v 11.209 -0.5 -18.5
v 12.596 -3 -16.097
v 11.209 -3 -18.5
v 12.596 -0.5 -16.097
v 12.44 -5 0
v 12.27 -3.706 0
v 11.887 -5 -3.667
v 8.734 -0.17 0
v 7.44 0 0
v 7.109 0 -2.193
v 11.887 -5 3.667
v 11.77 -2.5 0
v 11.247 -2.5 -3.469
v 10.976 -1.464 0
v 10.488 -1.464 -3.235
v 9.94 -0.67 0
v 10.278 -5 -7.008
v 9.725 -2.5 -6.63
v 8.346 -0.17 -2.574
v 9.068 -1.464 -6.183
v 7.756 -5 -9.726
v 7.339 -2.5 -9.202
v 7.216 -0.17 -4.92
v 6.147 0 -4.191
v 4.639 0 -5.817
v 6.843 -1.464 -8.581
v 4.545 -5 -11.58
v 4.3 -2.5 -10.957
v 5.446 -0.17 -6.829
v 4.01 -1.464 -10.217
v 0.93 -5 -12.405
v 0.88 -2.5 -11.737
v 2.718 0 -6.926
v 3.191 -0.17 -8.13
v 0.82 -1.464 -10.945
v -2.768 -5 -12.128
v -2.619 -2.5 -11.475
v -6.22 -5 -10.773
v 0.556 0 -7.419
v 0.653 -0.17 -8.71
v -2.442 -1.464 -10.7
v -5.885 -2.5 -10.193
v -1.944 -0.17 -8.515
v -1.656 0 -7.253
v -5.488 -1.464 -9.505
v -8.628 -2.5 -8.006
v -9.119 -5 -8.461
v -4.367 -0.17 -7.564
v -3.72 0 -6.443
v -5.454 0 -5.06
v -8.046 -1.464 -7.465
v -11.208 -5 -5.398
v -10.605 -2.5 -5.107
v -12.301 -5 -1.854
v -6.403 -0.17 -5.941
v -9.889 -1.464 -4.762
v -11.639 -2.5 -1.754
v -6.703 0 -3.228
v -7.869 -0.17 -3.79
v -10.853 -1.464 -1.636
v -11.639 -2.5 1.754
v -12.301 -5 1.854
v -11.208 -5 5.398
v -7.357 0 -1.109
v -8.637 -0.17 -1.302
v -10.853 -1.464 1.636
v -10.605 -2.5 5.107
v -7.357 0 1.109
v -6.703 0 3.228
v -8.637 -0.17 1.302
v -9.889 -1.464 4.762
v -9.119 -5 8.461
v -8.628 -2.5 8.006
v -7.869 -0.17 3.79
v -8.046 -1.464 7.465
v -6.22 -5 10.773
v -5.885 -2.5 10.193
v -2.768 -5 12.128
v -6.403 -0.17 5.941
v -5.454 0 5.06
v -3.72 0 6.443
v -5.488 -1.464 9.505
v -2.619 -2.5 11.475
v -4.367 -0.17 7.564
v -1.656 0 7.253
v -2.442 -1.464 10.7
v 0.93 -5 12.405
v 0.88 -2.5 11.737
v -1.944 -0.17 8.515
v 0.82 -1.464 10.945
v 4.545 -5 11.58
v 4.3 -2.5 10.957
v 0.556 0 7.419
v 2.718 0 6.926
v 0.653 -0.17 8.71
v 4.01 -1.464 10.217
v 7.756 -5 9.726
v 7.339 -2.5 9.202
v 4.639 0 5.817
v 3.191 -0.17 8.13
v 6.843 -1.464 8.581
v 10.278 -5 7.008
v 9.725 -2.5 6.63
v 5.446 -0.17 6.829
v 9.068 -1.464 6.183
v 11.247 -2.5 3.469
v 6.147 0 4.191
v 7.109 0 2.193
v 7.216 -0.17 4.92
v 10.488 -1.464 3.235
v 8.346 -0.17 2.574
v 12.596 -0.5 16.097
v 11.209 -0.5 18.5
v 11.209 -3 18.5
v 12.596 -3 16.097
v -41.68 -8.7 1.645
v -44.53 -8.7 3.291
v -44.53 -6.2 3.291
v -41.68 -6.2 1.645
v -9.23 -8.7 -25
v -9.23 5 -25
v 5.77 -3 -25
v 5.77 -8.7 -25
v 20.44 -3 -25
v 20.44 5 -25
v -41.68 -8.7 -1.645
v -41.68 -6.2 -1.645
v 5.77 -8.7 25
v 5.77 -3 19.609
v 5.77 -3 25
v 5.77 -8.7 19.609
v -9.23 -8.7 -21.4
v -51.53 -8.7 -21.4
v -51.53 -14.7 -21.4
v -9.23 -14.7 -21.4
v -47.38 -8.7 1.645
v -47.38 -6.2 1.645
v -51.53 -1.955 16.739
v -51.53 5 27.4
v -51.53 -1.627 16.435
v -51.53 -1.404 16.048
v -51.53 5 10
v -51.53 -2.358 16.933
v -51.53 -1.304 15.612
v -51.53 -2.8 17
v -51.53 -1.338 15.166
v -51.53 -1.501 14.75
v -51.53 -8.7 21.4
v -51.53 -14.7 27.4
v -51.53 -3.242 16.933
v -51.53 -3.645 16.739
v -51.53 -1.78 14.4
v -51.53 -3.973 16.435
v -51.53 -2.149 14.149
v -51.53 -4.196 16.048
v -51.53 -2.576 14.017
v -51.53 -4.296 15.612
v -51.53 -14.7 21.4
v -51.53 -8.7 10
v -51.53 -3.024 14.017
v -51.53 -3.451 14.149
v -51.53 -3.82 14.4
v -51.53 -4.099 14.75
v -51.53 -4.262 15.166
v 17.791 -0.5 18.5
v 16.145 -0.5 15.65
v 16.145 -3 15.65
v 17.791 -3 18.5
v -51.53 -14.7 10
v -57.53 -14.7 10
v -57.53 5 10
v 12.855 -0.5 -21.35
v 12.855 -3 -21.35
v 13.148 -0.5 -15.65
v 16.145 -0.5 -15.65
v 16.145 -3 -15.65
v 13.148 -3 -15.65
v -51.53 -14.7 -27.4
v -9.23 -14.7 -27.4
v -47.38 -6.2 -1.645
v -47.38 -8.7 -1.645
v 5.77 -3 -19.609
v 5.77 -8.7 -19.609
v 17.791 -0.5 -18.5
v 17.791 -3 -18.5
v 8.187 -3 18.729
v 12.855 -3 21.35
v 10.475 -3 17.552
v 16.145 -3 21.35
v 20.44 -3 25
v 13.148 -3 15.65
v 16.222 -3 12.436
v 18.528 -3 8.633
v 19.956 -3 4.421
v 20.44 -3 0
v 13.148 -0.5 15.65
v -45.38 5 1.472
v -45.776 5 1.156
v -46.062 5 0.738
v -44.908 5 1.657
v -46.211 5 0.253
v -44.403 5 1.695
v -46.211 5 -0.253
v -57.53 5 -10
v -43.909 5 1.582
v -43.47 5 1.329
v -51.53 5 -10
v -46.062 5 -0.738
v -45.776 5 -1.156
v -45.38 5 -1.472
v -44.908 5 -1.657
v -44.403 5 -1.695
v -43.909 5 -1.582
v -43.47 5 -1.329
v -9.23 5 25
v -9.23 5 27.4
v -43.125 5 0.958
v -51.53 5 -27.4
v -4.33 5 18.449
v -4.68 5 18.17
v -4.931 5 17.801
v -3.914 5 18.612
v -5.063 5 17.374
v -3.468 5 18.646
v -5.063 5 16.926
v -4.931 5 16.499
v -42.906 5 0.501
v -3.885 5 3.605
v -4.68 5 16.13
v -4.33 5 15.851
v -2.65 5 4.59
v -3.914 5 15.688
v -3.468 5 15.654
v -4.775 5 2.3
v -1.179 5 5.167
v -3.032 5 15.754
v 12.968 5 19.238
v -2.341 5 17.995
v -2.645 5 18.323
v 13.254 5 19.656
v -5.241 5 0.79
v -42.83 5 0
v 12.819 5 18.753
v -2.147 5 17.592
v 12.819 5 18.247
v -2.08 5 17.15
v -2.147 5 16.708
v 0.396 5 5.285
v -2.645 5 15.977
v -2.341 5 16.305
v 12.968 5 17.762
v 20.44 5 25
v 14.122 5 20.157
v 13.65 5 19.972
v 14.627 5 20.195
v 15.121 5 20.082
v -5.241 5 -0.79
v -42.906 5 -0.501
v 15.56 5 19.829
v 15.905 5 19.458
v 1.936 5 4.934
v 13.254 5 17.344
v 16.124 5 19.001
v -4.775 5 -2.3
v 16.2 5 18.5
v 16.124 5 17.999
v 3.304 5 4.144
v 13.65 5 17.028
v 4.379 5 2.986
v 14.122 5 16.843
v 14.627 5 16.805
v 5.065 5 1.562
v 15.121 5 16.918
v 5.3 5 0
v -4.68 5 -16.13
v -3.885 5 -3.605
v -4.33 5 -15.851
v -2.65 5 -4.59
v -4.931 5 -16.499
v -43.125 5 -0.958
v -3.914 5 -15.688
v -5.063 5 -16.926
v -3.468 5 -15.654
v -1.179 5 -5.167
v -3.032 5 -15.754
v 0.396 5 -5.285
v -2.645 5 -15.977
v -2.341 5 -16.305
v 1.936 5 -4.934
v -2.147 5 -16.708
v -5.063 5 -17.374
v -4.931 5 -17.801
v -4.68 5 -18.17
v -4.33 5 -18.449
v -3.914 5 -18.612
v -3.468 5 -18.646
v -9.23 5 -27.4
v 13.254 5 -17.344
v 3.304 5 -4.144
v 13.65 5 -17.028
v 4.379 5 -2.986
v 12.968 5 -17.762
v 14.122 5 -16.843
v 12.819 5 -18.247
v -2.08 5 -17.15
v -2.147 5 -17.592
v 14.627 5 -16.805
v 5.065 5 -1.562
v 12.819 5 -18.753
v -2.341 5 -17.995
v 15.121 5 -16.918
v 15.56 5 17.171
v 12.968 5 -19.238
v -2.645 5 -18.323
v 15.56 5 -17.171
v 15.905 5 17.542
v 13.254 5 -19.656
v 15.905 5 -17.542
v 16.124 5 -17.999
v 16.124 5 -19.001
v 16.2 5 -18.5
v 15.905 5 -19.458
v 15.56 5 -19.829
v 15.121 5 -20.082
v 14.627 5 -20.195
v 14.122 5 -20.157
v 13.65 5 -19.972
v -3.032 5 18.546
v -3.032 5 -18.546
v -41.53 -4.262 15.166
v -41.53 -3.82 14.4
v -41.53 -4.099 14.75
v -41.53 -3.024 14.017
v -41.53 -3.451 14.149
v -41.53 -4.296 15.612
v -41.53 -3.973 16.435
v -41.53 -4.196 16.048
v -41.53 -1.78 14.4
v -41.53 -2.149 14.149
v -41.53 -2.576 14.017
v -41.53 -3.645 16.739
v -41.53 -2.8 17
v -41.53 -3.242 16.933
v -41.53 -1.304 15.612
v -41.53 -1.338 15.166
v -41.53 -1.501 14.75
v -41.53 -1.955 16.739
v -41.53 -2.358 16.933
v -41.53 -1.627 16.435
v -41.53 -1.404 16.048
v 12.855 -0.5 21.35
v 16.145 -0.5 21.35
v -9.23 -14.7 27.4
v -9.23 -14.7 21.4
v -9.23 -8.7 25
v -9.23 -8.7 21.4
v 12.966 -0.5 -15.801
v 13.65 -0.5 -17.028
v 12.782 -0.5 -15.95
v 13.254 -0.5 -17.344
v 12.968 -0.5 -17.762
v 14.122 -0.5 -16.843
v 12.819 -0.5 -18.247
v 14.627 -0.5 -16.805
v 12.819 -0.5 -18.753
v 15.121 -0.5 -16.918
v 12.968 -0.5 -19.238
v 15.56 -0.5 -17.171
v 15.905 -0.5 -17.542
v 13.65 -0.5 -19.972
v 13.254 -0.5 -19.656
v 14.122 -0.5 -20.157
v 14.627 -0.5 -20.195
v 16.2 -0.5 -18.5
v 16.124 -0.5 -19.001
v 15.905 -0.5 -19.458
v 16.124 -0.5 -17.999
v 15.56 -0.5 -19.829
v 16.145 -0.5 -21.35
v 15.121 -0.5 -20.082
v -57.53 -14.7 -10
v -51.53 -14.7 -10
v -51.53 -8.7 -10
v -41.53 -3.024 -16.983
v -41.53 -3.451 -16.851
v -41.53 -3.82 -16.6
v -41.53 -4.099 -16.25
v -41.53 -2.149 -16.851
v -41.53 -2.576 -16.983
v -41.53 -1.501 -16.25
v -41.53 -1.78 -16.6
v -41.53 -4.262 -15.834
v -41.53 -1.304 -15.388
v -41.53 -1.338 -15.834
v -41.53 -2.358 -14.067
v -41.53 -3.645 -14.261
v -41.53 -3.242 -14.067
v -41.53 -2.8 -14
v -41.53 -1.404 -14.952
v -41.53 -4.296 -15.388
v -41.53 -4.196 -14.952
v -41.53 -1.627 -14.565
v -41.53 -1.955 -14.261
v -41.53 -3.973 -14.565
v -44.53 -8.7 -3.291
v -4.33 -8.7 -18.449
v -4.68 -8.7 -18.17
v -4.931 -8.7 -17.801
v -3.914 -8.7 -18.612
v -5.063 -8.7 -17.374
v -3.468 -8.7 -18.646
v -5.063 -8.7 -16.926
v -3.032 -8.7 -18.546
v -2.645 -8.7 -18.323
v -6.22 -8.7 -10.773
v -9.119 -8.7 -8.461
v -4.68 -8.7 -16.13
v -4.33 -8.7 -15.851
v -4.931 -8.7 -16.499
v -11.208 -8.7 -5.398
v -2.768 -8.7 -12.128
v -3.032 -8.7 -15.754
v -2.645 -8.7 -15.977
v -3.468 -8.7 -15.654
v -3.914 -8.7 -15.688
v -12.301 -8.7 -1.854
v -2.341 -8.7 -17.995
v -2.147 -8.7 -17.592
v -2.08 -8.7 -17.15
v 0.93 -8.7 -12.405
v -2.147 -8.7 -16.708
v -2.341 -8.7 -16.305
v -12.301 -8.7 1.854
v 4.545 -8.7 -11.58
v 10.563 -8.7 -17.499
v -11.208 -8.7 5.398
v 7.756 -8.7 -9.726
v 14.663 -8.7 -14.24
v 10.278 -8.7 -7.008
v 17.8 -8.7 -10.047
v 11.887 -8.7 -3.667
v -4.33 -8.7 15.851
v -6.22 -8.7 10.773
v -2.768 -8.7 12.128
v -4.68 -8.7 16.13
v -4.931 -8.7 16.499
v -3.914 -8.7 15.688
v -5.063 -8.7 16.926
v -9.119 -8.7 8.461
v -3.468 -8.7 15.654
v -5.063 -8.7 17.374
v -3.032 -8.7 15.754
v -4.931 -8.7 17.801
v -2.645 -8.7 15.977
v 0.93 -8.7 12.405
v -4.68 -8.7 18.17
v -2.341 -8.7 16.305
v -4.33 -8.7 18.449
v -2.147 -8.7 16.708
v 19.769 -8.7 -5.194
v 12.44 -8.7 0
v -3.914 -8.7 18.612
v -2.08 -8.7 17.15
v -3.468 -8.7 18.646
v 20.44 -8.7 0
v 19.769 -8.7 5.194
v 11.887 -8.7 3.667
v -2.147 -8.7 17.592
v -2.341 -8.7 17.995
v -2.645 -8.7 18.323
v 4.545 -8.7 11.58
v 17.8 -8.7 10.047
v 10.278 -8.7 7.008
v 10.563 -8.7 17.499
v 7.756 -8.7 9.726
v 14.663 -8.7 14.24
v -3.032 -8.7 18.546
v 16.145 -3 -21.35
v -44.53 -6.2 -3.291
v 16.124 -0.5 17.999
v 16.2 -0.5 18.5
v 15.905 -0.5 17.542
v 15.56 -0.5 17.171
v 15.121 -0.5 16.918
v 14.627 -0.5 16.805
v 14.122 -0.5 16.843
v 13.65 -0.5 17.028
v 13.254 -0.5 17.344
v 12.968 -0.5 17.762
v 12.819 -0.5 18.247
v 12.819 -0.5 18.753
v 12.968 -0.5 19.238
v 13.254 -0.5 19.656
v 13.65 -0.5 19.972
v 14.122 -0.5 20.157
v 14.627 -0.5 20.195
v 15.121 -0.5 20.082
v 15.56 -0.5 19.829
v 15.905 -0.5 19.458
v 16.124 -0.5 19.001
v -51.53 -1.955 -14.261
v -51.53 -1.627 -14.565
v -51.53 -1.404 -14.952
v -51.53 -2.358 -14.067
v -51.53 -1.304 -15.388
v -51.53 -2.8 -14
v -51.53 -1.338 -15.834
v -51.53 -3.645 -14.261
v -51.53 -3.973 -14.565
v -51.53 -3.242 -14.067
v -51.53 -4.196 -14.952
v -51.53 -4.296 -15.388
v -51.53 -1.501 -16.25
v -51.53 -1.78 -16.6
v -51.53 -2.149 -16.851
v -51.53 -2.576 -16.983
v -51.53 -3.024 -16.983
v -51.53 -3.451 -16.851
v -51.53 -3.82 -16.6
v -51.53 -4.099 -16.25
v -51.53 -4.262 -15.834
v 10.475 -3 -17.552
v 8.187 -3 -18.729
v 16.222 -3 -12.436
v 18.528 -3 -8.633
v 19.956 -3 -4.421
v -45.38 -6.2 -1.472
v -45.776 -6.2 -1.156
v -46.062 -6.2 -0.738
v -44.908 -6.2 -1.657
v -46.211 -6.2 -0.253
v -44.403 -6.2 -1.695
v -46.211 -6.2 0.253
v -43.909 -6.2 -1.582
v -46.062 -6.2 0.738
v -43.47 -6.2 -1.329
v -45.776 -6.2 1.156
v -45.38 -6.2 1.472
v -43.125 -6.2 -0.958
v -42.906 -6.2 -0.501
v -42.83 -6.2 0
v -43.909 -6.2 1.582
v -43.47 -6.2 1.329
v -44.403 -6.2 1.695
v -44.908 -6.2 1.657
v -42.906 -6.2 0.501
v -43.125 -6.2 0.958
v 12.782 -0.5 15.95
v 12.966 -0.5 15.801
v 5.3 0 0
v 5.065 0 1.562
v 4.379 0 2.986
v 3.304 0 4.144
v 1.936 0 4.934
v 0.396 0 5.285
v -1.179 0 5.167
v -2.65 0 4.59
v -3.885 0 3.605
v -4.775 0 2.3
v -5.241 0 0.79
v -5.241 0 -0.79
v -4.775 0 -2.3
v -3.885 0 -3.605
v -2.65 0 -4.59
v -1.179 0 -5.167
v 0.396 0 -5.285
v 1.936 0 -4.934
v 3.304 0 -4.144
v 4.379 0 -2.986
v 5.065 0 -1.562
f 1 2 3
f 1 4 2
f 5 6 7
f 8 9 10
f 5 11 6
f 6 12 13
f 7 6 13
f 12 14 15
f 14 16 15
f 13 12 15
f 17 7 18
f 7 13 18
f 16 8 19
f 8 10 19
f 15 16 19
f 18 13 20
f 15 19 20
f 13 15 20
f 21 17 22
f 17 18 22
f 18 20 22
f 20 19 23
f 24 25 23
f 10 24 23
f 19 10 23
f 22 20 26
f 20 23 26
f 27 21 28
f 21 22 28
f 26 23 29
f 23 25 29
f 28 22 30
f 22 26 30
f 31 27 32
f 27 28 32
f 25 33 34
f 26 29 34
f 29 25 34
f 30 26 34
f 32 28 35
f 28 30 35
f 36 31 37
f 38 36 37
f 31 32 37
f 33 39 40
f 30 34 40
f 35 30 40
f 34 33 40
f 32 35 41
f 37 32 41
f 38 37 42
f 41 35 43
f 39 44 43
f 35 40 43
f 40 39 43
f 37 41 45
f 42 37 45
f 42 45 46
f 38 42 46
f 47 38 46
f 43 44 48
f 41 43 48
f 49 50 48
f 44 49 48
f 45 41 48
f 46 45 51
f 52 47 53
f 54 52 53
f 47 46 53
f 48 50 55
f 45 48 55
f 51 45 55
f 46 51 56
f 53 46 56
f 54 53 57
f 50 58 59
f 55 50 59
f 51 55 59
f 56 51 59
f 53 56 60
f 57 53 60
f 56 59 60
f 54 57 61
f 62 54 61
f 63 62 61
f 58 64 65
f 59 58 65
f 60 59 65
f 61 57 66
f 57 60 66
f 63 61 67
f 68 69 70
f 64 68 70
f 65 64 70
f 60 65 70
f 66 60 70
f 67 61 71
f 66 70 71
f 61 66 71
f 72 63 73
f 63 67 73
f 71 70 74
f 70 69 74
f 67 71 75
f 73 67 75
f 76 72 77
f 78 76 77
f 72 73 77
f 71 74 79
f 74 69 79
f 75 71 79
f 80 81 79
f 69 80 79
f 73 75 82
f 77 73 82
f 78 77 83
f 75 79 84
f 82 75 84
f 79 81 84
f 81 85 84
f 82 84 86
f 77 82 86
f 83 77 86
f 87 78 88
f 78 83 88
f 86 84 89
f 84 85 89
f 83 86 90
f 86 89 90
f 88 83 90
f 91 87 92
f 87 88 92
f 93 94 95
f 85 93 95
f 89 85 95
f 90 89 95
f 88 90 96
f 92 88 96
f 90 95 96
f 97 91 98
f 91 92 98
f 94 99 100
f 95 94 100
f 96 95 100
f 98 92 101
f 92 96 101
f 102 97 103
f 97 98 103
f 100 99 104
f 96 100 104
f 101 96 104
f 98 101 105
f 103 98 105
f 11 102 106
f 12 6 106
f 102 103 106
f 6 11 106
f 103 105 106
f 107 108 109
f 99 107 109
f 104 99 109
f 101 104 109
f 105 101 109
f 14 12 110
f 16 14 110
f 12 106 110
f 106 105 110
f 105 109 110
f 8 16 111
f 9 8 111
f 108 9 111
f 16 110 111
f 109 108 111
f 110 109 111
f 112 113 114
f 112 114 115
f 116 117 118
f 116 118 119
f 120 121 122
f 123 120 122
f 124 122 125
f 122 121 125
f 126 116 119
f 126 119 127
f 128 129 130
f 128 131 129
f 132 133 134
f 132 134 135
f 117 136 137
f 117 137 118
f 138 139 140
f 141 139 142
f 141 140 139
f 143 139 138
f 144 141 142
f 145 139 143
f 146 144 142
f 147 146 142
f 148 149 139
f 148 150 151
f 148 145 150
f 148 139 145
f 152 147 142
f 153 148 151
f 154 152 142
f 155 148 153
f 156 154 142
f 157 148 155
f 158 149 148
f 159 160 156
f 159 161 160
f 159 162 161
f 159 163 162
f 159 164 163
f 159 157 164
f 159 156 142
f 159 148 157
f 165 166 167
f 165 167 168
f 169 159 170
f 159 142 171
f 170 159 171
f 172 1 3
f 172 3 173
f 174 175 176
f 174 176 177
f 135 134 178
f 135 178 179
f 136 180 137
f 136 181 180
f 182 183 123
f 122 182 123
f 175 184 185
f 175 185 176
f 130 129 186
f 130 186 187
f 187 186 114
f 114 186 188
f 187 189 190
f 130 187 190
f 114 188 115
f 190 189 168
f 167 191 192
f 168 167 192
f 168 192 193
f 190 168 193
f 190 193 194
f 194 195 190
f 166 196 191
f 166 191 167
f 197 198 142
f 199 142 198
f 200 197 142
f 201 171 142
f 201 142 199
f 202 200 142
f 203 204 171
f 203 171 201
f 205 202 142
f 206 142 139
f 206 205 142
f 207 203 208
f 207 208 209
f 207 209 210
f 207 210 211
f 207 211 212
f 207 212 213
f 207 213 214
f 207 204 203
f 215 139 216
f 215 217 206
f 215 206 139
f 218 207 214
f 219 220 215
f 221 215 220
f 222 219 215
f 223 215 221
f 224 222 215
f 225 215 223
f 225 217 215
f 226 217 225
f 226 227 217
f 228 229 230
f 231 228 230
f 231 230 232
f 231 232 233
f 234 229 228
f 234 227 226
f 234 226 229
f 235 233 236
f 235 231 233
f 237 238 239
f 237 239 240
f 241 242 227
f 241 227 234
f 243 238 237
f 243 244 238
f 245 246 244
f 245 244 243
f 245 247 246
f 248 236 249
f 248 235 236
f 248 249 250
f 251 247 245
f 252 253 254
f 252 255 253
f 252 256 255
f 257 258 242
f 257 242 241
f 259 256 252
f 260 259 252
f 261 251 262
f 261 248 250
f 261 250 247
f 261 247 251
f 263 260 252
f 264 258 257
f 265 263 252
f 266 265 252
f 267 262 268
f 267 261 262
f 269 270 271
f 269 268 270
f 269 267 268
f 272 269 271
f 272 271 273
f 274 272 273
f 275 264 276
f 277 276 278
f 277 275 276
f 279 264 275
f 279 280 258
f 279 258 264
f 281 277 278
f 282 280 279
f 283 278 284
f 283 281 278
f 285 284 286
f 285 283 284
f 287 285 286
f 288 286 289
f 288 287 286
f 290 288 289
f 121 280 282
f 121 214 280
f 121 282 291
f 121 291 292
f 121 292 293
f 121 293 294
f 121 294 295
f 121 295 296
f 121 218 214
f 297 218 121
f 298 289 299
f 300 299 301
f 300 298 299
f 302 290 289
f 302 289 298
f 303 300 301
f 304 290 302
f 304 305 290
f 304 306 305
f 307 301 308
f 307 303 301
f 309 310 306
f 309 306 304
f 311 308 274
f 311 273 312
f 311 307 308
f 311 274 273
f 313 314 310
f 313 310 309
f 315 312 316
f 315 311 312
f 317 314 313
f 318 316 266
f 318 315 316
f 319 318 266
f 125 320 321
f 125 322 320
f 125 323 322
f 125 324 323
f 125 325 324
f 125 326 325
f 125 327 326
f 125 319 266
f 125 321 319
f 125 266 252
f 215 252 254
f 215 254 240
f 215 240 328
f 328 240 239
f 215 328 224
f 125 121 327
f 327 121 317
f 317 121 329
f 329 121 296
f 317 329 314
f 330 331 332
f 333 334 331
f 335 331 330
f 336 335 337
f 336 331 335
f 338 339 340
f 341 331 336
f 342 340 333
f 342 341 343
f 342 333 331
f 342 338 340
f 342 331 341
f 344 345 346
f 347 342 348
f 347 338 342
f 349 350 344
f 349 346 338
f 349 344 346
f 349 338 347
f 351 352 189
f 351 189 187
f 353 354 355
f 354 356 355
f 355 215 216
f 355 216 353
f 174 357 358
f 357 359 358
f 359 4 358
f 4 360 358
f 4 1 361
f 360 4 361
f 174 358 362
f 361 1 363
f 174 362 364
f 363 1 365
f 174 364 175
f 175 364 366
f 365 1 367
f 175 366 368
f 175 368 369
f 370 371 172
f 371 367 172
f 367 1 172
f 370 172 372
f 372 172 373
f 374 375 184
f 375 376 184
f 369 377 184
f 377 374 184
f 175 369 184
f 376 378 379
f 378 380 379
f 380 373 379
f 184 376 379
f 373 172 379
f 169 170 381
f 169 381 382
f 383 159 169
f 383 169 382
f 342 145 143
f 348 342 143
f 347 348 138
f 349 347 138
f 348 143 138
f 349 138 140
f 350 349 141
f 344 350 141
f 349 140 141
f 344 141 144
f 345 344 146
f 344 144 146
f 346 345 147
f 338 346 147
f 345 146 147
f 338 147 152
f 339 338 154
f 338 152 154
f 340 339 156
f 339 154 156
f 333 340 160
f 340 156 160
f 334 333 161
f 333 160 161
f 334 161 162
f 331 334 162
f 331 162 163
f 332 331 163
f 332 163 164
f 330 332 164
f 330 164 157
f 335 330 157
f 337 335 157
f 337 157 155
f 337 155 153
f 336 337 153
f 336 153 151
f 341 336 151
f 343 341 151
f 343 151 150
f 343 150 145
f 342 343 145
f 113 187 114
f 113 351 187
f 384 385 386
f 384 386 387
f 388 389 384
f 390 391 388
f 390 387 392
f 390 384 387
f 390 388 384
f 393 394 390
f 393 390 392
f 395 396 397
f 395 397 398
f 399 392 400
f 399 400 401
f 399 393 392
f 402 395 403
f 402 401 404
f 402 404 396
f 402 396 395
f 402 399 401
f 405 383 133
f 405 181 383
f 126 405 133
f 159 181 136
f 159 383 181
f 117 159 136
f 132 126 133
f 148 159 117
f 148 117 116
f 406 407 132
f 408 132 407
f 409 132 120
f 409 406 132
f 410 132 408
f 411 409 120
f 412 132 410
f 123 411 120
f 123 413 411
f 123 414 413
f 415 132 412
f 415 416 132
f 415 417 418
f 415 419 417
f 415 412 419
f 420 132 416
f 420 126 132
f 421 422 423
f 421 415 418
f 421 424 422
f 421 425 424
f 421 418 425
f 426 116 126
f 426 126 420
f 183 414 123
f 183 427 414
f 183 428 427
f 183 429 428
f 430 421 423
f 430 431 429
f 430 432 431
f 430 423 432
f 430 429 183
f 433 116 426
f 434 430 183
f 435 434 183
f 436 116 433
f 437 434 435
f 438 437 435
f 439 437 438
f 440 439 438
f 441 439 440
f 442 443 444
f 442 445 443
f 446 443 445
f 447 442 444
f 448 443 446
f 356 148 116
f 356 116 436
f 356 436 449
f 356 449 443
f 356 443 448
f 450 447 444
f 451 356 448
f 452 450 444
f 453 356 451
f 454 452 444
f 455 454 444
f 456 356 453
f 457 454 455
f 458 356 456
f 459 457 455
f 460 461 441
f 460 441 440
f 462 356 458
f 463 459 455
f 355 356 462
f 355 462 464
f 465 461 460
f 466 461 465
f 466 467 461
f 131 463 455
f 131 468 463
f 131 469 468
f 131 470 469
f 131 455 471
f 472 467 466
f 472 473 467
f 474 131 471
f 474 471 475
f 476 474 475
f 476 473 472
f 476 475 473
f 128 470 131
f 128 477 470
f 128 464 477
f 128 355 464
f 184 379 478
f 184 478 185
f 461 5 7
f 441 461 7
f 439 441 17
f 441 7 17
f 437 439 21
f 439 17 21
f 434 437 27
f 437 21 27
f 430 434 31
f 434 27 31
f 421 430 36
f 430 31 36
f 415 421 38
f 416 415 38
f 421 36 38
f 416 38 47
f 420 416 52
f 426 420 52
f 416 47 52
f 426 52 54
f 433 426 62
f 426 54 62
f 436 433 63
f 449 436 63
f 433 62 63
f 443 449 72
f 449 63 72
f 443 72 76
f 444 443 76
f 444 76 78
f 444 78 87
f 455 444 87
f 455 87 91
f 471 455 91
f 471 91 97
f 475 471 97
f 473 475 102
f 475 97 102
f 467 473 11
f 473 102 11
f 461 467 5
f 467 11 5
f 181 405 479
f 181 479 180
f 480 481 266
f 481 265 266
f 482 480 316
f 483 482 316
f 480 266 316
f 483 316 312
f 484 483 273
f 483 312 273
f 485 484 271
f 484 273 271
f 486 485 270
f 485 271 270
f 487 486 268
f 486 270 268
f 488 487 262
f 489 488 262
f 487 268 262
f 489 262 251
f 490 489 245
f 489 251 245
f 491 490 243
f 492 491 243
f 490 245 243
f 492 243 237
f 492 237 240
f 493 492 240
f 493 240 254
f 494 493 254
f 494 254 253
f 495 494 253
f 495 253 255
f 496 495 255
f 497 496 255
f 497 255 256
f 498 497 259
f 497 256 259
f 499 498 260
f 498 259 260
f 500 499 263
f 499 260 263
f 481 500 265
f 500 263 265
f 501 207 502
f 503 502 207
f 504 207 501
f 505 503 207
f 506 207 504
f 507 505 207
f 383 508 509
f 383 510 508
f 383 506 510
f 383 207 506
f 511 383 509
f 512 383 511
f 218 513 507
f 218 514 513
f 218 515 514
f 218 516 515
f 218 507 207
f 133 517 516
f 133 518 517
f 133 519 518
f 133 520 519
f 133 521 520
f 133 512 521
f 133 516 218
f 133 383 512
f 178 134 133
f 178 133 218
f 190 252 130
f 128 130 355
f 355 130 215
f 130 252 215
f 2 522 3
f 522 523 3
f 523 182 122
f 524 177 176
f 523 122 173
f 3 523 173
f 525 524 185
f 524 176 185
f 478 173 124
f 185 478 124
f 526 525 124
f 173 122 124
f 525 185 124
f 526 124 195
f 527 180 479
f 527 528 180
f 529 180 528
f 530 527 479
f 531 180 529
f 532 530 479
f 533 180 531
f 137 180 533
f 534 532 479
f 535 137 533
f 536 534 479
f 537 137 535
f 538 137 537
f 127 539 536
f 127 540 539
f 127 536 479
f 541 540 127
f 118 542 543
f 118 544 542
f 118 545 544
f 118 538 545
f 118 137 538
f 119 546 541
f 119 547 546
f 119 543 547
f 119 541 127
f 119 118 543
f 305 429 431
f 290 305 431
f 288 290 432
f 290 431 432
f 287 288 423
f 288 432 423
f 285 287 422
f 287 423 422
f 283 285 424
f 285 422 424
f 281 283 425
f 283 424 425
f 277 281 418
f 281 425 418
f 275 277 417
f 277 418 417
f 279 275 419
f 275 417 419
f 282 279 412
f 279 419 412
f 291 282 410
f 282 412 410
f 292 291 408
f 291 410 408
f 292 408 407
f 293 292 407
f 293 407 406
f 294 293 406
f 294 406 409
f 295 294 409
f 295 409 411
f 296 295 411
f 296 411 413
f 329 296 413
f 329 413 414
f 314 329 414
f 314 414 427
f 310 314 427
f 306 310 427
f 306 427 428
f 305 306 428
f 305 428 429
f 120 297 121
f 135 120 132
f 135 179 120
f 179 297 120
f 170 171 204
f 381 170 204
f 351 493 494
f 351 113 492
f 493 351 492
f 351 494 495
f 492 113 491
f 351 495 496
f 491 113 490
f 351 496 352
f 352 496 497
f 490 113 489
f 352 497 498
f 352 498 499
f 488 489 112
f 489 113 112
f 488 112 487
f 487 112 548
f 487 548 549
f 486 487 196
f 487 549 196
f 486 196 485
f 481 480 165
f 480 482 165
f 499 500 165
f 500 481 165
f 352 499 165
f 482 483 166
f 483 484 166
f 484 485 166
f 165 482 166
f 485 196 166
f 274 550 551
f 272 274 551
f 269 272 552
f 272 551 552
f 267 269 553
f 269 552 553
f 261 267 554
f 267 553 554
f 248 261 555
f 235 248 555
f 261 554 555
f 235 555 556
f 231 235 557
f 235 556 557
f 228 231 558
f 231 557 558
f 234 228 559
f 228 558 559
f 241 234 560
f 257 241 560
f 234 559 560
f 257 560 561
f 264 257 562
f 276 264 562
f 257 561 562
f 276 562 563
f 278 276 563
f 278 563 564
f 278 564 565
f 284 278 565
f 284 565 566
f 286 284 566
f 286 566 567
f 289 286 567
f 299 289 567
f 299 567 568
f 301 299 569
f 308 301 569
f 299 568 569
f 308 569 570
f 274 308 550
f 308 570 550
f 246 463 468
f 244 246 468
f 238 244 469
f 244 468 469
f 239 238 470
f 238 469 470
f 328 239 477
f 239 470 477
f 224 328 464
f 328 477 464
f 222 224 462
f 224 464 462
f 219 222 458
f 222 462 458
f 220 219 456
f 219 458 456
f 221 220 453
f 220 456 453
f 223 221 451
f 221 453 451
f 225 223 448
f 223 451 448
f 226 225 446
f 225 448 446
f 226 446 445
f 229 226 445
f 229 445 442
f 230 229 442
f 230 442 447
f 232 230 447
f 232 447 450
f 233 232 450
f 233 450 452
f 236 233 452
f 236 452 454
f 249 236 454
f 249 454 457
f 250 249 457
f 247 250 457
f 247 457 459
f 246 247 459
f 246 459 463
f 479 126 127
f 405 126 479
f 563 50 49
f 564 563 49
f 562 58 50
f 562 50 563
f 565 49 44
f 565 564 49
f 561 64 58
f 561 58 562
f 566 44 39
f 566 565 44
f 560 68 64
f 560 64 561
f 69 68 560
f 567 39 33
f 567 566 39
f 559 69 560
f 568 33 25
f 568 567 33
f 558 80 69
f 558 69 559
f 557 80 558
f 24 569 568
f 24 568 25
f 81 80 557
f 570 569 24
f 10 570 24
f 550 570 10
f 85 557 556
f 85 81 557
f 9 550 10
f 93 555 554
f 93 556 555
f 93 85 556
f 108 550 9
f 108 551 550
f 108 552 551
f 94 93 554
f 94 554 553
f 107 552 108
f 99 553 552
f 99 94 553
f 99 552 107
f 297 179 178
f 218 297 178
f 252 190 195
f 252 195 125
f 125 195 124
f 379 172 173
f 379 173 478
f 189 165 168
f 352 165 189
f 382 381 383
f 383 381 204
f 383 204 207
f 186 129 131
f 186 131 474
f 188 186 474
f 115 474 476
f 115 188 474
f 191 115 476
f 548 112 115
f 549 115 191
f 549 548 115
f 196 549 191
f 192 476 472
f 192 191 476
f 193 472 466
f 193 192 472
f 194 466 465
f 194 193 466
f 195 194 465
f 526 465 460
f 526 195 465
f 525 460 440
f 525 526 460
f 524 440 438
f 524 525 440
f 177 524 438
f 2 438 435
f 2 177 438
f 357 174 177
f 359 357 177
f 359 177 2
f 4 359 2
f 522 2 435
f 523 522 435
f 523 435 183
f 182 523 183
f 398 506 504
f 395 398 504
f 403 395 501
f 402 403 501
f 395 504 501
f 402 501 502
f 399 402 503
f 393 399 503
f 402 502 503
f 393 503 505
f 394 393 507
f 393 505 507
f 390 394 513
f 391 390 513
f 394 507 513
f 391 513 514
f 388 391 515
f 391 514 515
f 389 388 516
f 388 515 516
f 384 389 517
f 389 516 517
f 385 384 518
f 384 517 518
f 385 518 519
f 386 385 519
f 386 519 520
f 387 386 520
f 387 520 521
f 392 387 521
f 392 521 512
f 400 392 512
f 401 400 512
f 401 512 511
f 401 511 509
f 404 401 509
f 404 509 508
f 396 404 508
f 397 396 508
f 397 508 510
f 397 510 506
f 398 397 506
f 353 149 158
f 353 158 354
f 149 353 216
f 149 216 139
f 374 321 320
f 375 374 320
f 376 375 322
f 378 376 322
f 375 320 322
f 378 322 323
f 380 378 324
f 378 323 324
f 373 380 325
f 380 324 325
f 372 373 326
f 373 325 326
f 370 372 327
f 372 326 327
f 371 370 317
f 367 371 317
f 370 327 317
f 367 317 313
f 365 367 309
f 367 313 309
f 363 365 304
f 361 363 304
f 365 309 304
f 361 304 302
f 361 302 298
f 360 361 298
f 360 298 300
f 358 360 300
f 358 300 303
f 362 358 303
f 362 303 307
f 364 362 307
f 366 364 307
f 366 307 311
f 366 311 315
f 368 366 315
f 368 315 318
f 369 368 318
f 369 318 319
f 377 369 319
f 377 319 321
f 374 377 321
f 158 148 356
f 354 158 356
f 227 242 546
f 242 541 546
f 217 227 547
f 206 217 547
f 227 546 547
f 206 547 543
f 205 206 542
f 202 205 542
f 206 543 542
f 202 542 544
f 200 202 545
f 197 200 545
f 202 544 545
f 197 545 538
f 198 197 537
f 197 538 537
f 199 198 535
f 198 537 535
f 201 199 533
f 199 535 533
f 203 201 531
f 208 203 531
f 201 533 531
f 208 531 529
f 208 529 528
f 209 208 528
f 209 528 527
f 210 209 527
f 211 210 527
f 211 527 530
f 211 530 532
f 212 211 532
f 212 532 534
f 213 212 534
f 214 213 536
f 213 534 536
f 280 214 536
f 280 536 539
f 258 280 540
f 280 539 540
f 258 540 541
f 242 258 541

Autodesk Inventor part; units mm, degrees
ref_plane "YZ Plane" through (0, 0, 0) normal (1, 0, 0) x (0, 1, 0)
ref_plane "XZ Plane" through (0, 0, 0) normal (0, 1, 0) x (-1, 0, 0)
ref_plane "XY Plane" through (0, 0, 0) normal (0, 0, 1) x (1, 0, 0)
sketch "Sketch1" plane through (0, 0, 0) normal (0, 0, 1) x (1, 0, 0)
  line L0 (0, -8.6) -> (12.34, -8.6) construction
  line L1 (0, 0) -> (0, -8.6)
  line L2 (0, 0) -> (0, -2.1)
  line L3 (0, -2.1) -> (5.3, -2.1)
  line L4 (5.3, -2.1) -> (5.3, 0)
  line L5 (5.3, 0) -> (7.44, 0)
  line L6 (12.44, -8.7) -> (12.44, -5)
  arc A0 (12.44, -5) -> (7.44, 0) centre (7.44, -5) ccw
  line L7 (12.44, -8.7) -> (20.44, -8.7)
  line L8 (20.44, -8.7) -> (20.44, 5)
  line L9 (20.44, 5) -> (0, 5)
  line L10 (0, 5) -> (0, -2.1)
  line L11 (-4.088, 0) -> (24.528, 0) projected
  dimension "d2" = 12.34
  dimension "d3" = 8.6
  dimension "d7" = 0
  dimension "d11" = 5.3
  dimension "d12" = 2.1
  dimension "d14" = 5
  dimension "d15" = 8
  dimension "d16" = 13.7
  dimension "d17" = 3.7
  dimension "d18" = 5
revolve "Revolution2" add sketch "Sketch1" angle 360 about axis through (0, 5, 0) along (0, -1, 0)
sketch "Sketch2" plane through (0, 5, 0) normal (0, 1, 0) x (1, 0, 0)
  line L0 (-25, 25) -> (25, 25)
  line L1 (25, 25) -> (25, -25)
  line L2 (25, -25) -> (-25, -25)
  line L3 (-25, -25) -> (-25, 25)
  line L4 (-18.5, 18.5) -> (14.5, 18.5) construction
  line L5 (14.5, 18.5) -> (14.5, -18.5) construction
  line L6 (14.5, -18.5) -> (-18.5, -18.5) construction
  line L7 (-18.5, -18.5) -> (-18.5, 18.5) construction
  circle A0 centre (-18.5, 18.5) radius 1.7
  circle A1 centre (14.5, 18.5) radius 1.7
  circle A2 centre (-18.5, -18.5) radius 1.7
  circle A3 centre (14.5, -18.5) radius 1.7
  line L8 (12.8546, 21.35) -> (16.1454, 21.35)
  line L9 (16.1454, 21.35) -> (17.7909, 18.5)
  line L10 (17.7909, 18.5) -> (16.1454, 15.65)
  line L11 (16.1454, 15.65) -> (12.8546, 15.65)
  line L12 (12.8546, 15.65) -> (11.2091, 18.5)
  line L13 (11.2091, 18.5) -> (12.8546, 21.35)
  line L14 (-17.6058, 15.3329) -> (-20.7956, 16.142)
  line L15 (-20.7956, 16.142) -> (-21.6899, 19.3091)
  line L16 (-21.6899, 19.3091) -> (-19.3942, 21.6671)
  line L17 (-19.3942, 21.6671) -> (-16.2044, 20.858)
  line L18 (-16.2044, 20.858) -> (-15.3101, 17.6909)
  line L19 (-15.3101, 17.6909) -> (-17.6058, 15.3329)
  line L20 (-16.0239, -20.6677) -> (-19.1393, -21.7282)
  line L21 (-19.1393, -21.7282) -> (-21.6153, -19.5605)
  line L22 (-21.6153, -19.5605) -> (-20.9761, -16.3323)
  line L23 (-20.9761, -16.3323) -> (-17.8607, -15.2718)
  line L24 (-17.8607, -15.2718) -> (-15.3847, -17.4395)
  line L25 (-15.3847, -17.4395) -> (-16.0239, -20.6677)
  line L26 (17.7909, -18.5) -> (16.1454, -21.35)
  line L27 (16.1454, -21.35) -> (12.8546, -21.35)
  line L28 (12.8546, -21.35) -> (11.2091, -18.5)
  line L29 (11.2091, -18.5) -> (12.8546, -15.65)
  line L30 (12.8546, -15.65) -> (16.1454, -15.65)
  line L31 (16.1454, -15.65) -> (17.7909, -18.5)
  circle A4 centre (0, 0) radius 12.44 projected
  circle A5 centre (0, 0) radius 12.44 projected
  dimension "d25" = 33
  dimension "d27" = 18.5
  dimension "d28" = 18.5
  dimension "d29" = 37
  dimension "d30" = 3.4
  dimension "d31" = 3.4
  dimension "d32" = 3.4
  dimension "d33" = 3.4
  dimension "d34" = 5.7
  dimension "d36" = 5.7
  dimension "d37" = 5.7
  dimension "d38" = 5.7
  dimension "d39" = 50
  dimension "d40" = 50
  dimension "d41" = 25
  dimension "d42" = 25
extrude "Extrusion1" add sketch "Sketch2" against normal blind 8 contours L0 L1 L2 L3
extrude "Extrusion2" add sketch "Sketch2" against normal blind 5.5 contours L8 L9 L10 L11 L12 L13 | L14 L15 L16 L17 L18 L19 | L20 L21 L22 L23 L24 L25 | L26 L27 L28 L29 L30 L31
sketch "Sketch4" plane through (0, -2.1, 0) normal (0, -1, 0) x (1, 0, 0)
  circle A0 centre (0, 0) radius 5.3 projected
  point P0 (0, 0)
extrude "Extrusion4" cut sketch "Sketch4" against normal blind 19.5
sketch "Sketch5" plane through (0, -8.7, 0) normal (0, -1, 0) x (1, 0, 0)
  circle A0 centre (0, 0) radius 20.44 projected
  circle A1 centre (0, 0) radius 12.44 projected
  line L0 (-25, -25) -> (25, -25) projected
  line L1 (25, -25) -> (25, 25) projected
  line L2 (25, 25) -> (-25, 25) projected
  line L3 (-25, 25) -> (-25, -25) projected
  line L4 (12.8546, -21.35) -> (11.2091, -18.5) projected
  line L5 (11.2091, -18.5) -> (12.5962, -16.0975) projected
  line L6 (16.1454, -15.65) -> (17.7909, -18.5) projected
  line L7 (17.7909, -18.5) -> (16.1454, -21.35) projected
  line L8 (16.1454, -21.35) -> (12.8546, -21.35) projected
  line L9 (-15.3101, -17.6909) -> (-16.2044, -20.858) projected
  line L10 (-16.2044, -20.858) -> (-19.3942, -21.6671) projected
  line L11 (-19.3942, -21.6671) -> (-21.6899, -19.3091) projected
  line L12 (-21.6899, -19.3091) -> (-20.7956, -16.142) projected
  line L13 (-20.7956, -16.142) -> (-17.6058, -15.3329) projected
  line L14 (-16.0239, 20.6677) -> (-15.3847, 17.4395) projected
  line L15 (-17.8607, 15.2718) -> (-20.9761, 16.3323) projected
  line L16 (-20.9761, 16.3323) -> (-21.6153, 19.5605) projected
  line L17 (-21.6153, 19.5605) -> (-19.1393, 21.7282) projected
  line L18 (-19.1393, 21.7282) -> (-16.0239, 20.6677) projected
  line L19 (17.7909, 18.5) -> (16.1454, 15.65) projected
  line L20 (12.5962, 16.0975) -> (11.2091, 18.5) projected
  line L21 (11.2091, 18.5) -> (12.8546, 21.35) projected
  line L22 (12.8546, 21.35) -> (16.1454, 21.35) projected
  line L23 (16.1454, 21.35) -> (17.7909, 18.5) projected
  arc A2 (12.5962, 16.0975) -> (12.5962, -16.0975) centre (0, 0) ccw projected
  line L24 (-25, 25) -> (3.4372, 20.1489)
  line L25 (-25, -25) -> (3.4372, -20.1489)
  circle A3 centre (0, 0) radius 20.44 projected
  arc A4 (3.4372, 20.1489) -> (3.4372, -20.1489) centre (0, 0) ccw
  line L26 (-25, 25) -> (-51.53, 25)
  line L27 (-51.53, 25) -> (-51.53, -25)
  line L28 (-51.53, -25) -> (-25, -25)
  line L29 (-25, -25) -> (-25, 25)
  line L30 (-17.6058, -15.3329) -> (-15.3101, -17.6909) projected
  line L31 (-15.3847, 17.4395) -> (-17.8607, 15.2718) projected
  arc A5 (13.148, -15.65) -> (13.148, 15.65) centre (0, 0) ccw projected
  line L32 (13.148, -15.65) -> (16.1454, -15.65) projected
  line L33 (16.1454, 15.65) -> (13.148, 15.65) projected
  point P0 (0, 0)
  dimension "d52" = 26.53
extrude "Extrusion5" add sketch "Sketch5" against normal blind 13.7 contours A0 L25 L3 L24 | L3 L28 L27 L26 | L9 L10 L11 L12 L13 L30 | L14 L31 L15 L16 L17 L18
sketch "Sketch6" plane through (-51.53, -8.7, 25) normal (0, -1, 0) x (1, 0, 0)
  arc A0 (54.9672, -45.1489) -> (54.9672, -4.8511) centre (51.53, -25) ccw projected
  line L0 (54.9672, -4.8511) -> (26.53, 0) projected
  line L1 (26.53, 0) -> (0, 0) projected
  line L2 (0, 0) -> (0, -50) projected
  line L3 (0, -50) -> (26.53, -50) projected
  line L4 (26.53, -50) -> (54.9672, -45.1489) projected
  circle A1 centre (51.53, -25) radius 12.44 projected
  line L5 (0, -3.6) -> (42.3, -3.6)
  line L6 (0, -46.4) -> (42.3, -46.4)
  line L7 (9.85, -26.6454) -> (7, -28.2909)
  line L8 (7, -28.2909) -> (4.15, -26.6454)
  line L9 (4.15, -26.6454) -> (4.15, -23.3546)
  line L10 (4.15, -23.3546) -> (7, -21.7091)
  line L11 (7, -21.7091) -> (9.85, -23.3546)
  line L12 (9.85, -23.3546) -> (9.85, -26.6454)
  circle A2 centre (7, -25) radius 1.7
  line L13 (42.3, -3.6) -> (42.3, -2.6902)
  line L14 (42.3, -46.4) -> (42.3, -47.3098)
  point P0 (47.6334, -3.6)
  point P1 (47.6334, -46.4)
  dimension "d55" = 3.6
  dimension "d56" = 3.6
  dimension "d57" = 5.7
  dimension "d58" = 7
  dimension "d59" = 50
  dimension "d60" = 25
  dimension "d61" = 3.4
  dimension "d68" = 42.3
extrude "Extrusion6" cut sketch "Sketch6" against normal blind 19.95 contours A2
extrude "Extrusion7" cut sketch "Sketch6" against normal blind 2.5 contours L7 L8 L9 L10 L11 L12
extrude "Extrusion8" add sketch "Sketch6" along normal blind 6 contours L4 L3 L2 L6 L14 | L13 L5 L2 L1 L0
sketch "Sketch7" plane through (0, -8.7, 0) normal (0, -1, 0) x (1, 0, 0)
  line L0 (-9.23, 21.4) -> (-51.53, 21.4) projected
  line L1 (-51.53, 21.4) -> (-51.53, -21.4) projected
  line L2 (-51.53, -21.4) -> (-9.23, -21.4) projected
  line L3 (-9.23, -21.4) -> (-9.23, -22.3098) projected
  line L4 (-9.23, -22.3098) -> (3.4372, -20.1489) projected
  arc A0 (3.4372, -20.1489) -> (3.4372, 20.1489) centre (0, 0) ccw projected
  line L5 (3.4372, 20.1489) -> (-9.23, 22.3098) projected
  line L6 (-9.23, 22.3098) -> (-9.23, 21.4) projected
  line L7 (-41.68, 1.6454) -> (-41.68, -1.6454) projected
  line L8 (-41.68, -1.6454) -> (-44.53, -3.2909) projected
  line L9 (-44.53, -3.2909) -> (-47.38, -1.6454) projected
  line L10 (-47.38, -1.6454) -> (-47.38, 1.6454) projected
  line L11 (-47.38, 1.6454) -> (-44.53, 3.2909) projected
  line L12 (-44.53, 3.2909) -> (-41.68, 1.6454) projected
  circle A1 centre (0, 0) radius 12.44 projected
  line L13 (3.4372, -20.1489) -> (-25, -25) projected
  line L14 (-25, -25) -> (25, -25) projected
  line L15 (25, -25) -> (25, 25) projected
  line L16 (25, 25) -> (-25, 25) projected
  line L17 (-25, 25) -> (3.4372, 20.1489) projected
  arc A2 (3.4372, -20.1489) -> (12.5962, -16.0975) centre (0, 0) ccw projected
  line L18 (12.8546, -21.35) -> (11.2091, -18.5) projected
  line L19 (11.2091, -18.5) -> (12.5962, -16.0975) projected
  line L20 (16.1454, -15.65) -> (17.7909, -18.5) projected
  line L21 (17.7909, -18.5) -> (16.1454, -21.35) projected
  line L22 (16.1454, -21.35) -> (12.8546, -21.35) projected
  line L23 (17.7909, 18.5) -> (16.1454, 15.65) projected
  line L24 (12.5962, 16.0975) -> (11.2091, 18.5) projected
  line L25 (11.2091, 18.5) -> (12.8546, 21.35) projected
  line L26 (12.8546, 21.35) -> (16.1454, 21.35) projected
  line L27 (16.1454, 21.35) -> (17.7909, 18.5) projected
  line L28 (-51.53, -25) -> (25, -25) projected
  line L29 (-9.23, -12.44) -> (5.77, -12.44)
  line L30 (5.77, -12.44) -> (5.77, -25)
  line L31 (5.77, -25) -> (-9.23, -25)
  line L32 (-9.23, -25) -> (-9.23, -12.44)
  line L33 (-9.23, -22.3098) -> (-9.23, -21.4) projected
  line L34 (-9.23, 12.44) -> (5.77, 12.44)
  line L35 (5.77, 12.44) -> (5.77, 25)
  line L36 (5.77, 25) -> (-9.23, 25)
  line L37 (-9.23, 25) -> (-9.23, 12.44)
  line L38 (-9.23, 21.4) -> (-9.23, 22.3098) projected
  circle A3 centre (0, 0) radius 12.44 projected
  line L39 (-9.23, -25) -> (-25, -25)
  line L40 (-25, -25) -> (-9.23, -22.3098)
  line L41 (3.4372, -20.1489) -> (-25, -25) projected
  line L42 (-9.23, -22.3098) -> (-9.23, -25)
  line L43 (-9.23, 22.3098) -> (-9.23, 25)
  line L44 (25, 25) -> (-25, 25) projected
  line L45 (-9.23, 25) -> (-25, 25)
  line L46 (-25, 25) -> (-9.23, 22.3098)
  arc A4 (12.5962, 16.0975) -> (3.4372, 20.1489) centre (0, 0) ccw projected
  line L47 (16.1454, 15.65) -> (13.148, 15.65) projected
  arc A5 (13.148, -15.65) -> (13.148, 15.65) centre (0, 0) ccw projected
  line L48 (13.148, -15.65) -> (16.1454, -15.65) projected
  point P0 (0, 0)
  dimension "d69" = 15
  dimension "d70" = 15
extrude "Extrusion9" add sketch "Sketch7" against normal blind 6 contours L6 L5 A0 L35 L34 L37 | L37 L16 L35 A0 L5 | L17 L16 L37 | L32 L29 L30 A0 L4 L3 | L32 L14 L13 | L4 A0 L30 L14 L32
sketch "Sketch8" plane through (-51.53, -8.7, -21.4) normal (0, -1, 0) x (1, 0, 0)
  line L0 (39.8818, 0.25) -> (21.4052, 0.25) construction
  line L1 (26.53, -3.6) -> (57.3, -3.6) projected
  circle A0 centre (36.65, 5.9) radius 1.5 construction
  line L2 (42.3, -0.9098) -> (42.3, 0) construction
  circle A1 centre (47.95, 4.25) radius 1.5
  line L3 (30.1874, 42.55) -> (42.031, 42.55) construction
  line L4 (57.3, 46.4) -> (26.53, 46.4) projected
  circle A2 centre (36.65, 36.9) radius 1.5 construction
  circle A3 centre (47.95, 38.55) radius 1.5
  line L5 (42.3, 42.8) -> (42.3, 43.7098) construction
  point P0 (51.53, 21.4)
  dimension "d73" = 3.85
  dimension "d74" = 5.65
  dimension "d75" = 5.65
  dimension "d76" = 3
  dimension "d77" = 3
  dimension "d78" = 5.65
  dimension "d79" = 4
  dimension "d80" = 3.85
  dimension "d81" = 3
  dimension "d82" = 3
  dimension "d83" = 5.65
  dimension "d84" = 4
  dimension "d86" = 5.65
  dimension "d87" = 5.65
extrude "Extrusion10" cut sketch "Sketch8" against normal blind 17
sketch "Sketch9" plane through (-51.53, -8.7, -21.4) normal (0, -1, 0) x (1, 0, 0)
  line L0 (0, 42.8) -> (0, 0) projected
  line L1 (0, 31.4) -> (-6, 31.4)
  line L2 (-6, 31.4) -> (-6, 11.4)
  line L3 (-6, 11.4) -> (0, 11.4)
  line L4 (0, 11.4) -> (0, 31.4)
  line L5 (42.3, 42.8) -> (0, 42.8) projected
  line L6 (0, 0) -> (42.3, 0) projected
  point P0 (51.53, 21.4)
  dimension "d94" = 42.8
  dimension "d95" = 20
  dimension "d96" = 11.4
  dimension "d107" = 6
extrude "Extrusion11" add sketch "Sketch9" against normal blind 13.7
extrude "Extrusion12" add sketch "Sketch9" along normal blind 6
sketch "Sketch10" plane through (-51.53, -14.7, 25) normal (0, -1, 0) x (1, 0, 0)
  line L0 (26.53, 0) -> (0, 0) projected
  line L1 (0, 0) -> (0, -3.6) projected
  line L2 (0, -3.6) -> (42.3, -3.6) projected
  line L3 (42.3, -3.6) -> (42.3, -2.6902) projected
  line L4 (42.3, -2.6902) -> (26.53, 0) projected
  line L5 (0, -50) -> (26.53, -50) projected
  line L6 (26.53, -50) -> (42.3, -47.3098) projected
  line L7 (42.3, -47.3098) -> (42.3, -46.4) projected
  line L8 (42.3, -46.4) -> (0, -46.4) projected
  line L9 (0, -46.4) -> (0, -50) projected
  line L10 (0, -3.6) -> (42.3, -3.6)
  line L11 (42.3, -3.6) -> (42.3, 2.4)
  line L12 (42.3, 2.4) -> (0, 2.4)
  line L13 (0, 2.4) -> (0, -3.6)
  line L14 (0, -46.4) -> (42.3, -46.4)
  line L15 (42.3, -46.4) -> (42.3, -52.4)
  line L16 (42.3, -52.4) -> (0, -52.4)
  line L17 (0, -52.4) -> (0, -46.4)
  line L18 (42.3, -3.6) -> (42.3, -2.6902) projected
  point P0 (51.53, -25)
  dimension "d101" = 6
  dimension "d102" = 6
extrude "Extrusion13" add sketch "Sketch10" against normal blind 19.7
sketch "Sketch11" plane through (0, -3, 0) normal (0, -1, 0) x (1, 0, 0)
  line L0 (5.77, -25) -> (25, -25) projected
  line L1 (25, 25) -> (20.44, 25)
  line L2 (20.44, 25) -> (20.44, -25)
  line L3 (20.44, -25) -> (25, -25)
  line L4 (25, -25) -> (25, 25)
  arc A0 (5.77, -19.6087) -> (5.77, 19.6087) centre (0, 0) ccw projected
  point P0 (0, 0)
extrude "Extrusion14" cut sketch "Sketch11" against normal blind 19.7
sketch "Sketch12" plane through (-51.53, -14.7, -21.4) normal (-1, 0, 0) x (0, 0, 1)
  line L0 (11.4, 6) -> (0, 6) projected
  line L1 (11.4, 6) -> (11.4, 19.7) projected
  line L2 (-6, 19.7) -> (11.4, 19.7) projected
  line L3 (-6, 0) -> (-6, 19.7) projected
  line L4 (0, 0) -> (-6, 0) projected
  line L5 (0, 6) -> (0, 0) projected
  line L6 (31.4, 19.7) -> (48.8, 19.7) projected
  line L7 (31.4, 19.7) -> (31.4, 6) projected
  line L8 (42.8, 6) -> (31.4, 6) projected
  line L9 (42.8, 6) -> (42.8, 0) projected
  line L10 (48.8, 0) -> (42.8, 0) projected
  line L11 (48.8, 0) -> (48.8, 19.7) projected
  circle A0 centre (5.9, 11.9) radius 1.5
  circle A1 centre (36.9, 11.9) radius 1.5
  point P0 (21.4, 14.7)
  dimension "d108" = 3
  dimension "d109" = 3
  dimension "d110" = 5.9
  dimension "d111" = 5.9
  dimension "d112" = 5.9
  dimension "d113" = 5.9
extrude "Extrusion15" cut sketch "Sketch12" against normal blind 10 contours A0 | A1
equation "\"d27\" = 0.5 * d29"
equation "\"d28\" = d27"
equation "\"d36\" = d34"
equation "\"d37\" = d34"
equation "\"d38\" = d34"
equation "\"d41\" = 0.5 * d39"
equation "\"d42\" = d41"
equation "\"d60\" = 0.5 * d59"
equation "\"d96\" = -0.5 * d95 + 0.5 * d94"
properties part number "BallBearingCupMountBottom"
